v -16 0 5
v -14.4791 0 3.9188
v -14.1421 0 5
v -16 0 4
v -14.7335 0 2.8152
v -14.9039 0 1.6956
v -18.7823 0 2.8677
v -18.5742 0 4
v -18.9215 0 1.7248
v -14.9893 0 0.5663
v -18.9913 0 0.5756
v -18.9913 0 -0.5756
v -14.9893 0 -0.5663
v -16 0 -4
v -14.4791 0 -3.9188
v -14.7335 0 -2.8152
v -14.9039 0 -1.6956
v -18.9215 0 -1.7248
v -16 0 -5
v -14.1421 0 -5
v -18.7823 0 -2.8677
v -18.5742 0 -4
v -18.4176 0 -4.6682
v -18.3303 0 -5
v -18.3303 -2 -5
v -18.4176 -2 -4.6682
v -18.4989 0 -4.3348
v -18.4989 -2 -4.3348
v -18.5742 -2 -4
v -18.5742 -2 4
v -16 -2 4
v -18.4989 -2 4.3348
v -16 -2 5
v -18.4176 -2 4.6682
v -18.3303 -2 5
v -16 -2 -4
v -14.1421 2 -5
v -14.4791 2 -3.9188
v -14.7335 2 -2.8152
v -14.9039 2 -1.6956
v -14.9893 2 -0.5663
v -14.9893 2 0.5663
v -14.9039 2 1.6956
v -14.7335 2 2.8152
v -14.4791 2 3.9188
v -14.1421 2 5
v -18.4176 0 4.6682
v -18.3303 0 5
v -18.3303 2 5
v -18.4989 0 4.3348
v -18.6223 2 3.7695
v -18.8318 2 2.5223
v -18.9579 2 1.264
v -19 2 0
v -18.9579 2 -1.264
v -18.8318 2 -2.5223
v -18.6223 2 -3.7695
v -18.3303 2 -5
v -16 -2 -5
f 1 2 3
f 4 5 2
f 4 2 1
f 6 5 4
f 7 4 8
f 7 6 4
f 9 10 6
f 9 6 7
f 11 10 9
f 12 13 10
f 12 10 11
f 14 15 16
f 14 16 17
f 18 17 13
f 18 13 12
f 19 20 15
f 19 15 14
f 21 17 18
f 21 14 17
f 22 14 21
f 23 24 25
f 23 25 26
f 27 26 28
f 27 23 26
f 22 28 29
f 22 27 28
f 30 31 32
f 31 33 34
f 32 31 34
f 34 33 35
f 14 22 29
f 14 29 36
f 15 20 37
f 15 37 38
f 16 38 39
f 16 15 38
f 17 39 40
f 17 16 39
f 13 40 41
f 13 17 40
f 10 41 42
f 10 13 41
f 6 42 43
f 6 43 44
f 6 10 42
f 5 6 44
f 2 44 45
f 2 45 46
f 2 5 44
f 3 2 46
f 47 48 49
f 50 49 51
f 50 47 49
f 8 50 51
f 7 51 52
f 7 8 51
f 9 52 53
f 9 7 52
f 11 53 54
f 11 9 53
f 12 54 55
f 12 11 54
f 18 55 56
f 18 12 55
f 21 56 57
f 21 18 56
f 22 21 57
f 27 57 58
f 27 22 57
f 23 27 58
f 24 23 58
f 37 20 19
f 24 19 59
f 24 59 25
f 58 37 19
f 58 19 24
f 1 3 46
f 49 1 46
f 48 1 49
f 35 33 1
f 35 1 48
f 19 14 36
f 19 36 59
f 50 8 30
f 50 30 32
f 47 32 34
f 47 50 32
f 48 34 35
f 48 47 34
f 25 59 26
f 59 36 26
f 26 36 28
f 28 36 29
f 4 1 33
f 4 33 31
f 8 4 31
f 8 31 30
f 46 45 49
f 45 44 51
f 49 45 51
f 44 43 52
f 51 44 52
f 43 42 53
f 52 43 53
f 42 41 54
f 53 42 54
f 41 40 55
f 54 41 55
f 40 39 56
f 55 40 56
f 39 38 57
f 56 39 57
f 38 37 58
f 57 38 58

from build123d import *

# Parameters (mm, degrees)
BOSS_EXTRUDE1_DEPTH = 2
BOSS_EXTRUDE2_DEPTH = 2


with BuildPart() as part:
    # Sketch1 → Boss-Extrude1 (new body)
    with BuildSketch(Plane(origin=(0, 0, 0), x_dir=(1, 0, 0), z_dir=(0, 1, 0))):
        with BuildLine():
            Line((-18.33030278, 5), (-14.142135624, 5))
            ThreePointArc((-14.142135624, 5), (-15, 0), (-14.142135624, -5))
            Line((-14.142135624, -5), (-18.33030278, -5))
            ThreePointArc((-18.33030278, -5), (-19, 0), (-18.33030278, 5))
        make_face()
    extrude(amount=BOSS_EXTRUDE1_DEPTH)

    # Sketch2 → Boss-Extrude2 (add)
    with BuildSketch(Plane.XZ):
        with BuildLine():
            Line((-16, -5), (-18.33030278, -5))
            ThreePointArc((-18.33030278, -5), (-18.459012203, -4.501651751), (-18.574175621, -4))
            Line((-18.574175621, -4), (-16, -4))
            Line((-16, -4), (-16, -5))
        make_face()
        with BuildLine():
            Line((-18.33030278, 5), (-16, 5))
            Line((-16, 5), (-16, 4))
            Line((-16, 4), (-18.574175621, 4))
            ThreePointArc((-18.574175621, 4), (-18.459012203, 4.501651751), (-18.33030278, 5))
        make_face()
    extrude(amount=BOSS_EXTRUDE2_DEPTH)


solid = part.part
